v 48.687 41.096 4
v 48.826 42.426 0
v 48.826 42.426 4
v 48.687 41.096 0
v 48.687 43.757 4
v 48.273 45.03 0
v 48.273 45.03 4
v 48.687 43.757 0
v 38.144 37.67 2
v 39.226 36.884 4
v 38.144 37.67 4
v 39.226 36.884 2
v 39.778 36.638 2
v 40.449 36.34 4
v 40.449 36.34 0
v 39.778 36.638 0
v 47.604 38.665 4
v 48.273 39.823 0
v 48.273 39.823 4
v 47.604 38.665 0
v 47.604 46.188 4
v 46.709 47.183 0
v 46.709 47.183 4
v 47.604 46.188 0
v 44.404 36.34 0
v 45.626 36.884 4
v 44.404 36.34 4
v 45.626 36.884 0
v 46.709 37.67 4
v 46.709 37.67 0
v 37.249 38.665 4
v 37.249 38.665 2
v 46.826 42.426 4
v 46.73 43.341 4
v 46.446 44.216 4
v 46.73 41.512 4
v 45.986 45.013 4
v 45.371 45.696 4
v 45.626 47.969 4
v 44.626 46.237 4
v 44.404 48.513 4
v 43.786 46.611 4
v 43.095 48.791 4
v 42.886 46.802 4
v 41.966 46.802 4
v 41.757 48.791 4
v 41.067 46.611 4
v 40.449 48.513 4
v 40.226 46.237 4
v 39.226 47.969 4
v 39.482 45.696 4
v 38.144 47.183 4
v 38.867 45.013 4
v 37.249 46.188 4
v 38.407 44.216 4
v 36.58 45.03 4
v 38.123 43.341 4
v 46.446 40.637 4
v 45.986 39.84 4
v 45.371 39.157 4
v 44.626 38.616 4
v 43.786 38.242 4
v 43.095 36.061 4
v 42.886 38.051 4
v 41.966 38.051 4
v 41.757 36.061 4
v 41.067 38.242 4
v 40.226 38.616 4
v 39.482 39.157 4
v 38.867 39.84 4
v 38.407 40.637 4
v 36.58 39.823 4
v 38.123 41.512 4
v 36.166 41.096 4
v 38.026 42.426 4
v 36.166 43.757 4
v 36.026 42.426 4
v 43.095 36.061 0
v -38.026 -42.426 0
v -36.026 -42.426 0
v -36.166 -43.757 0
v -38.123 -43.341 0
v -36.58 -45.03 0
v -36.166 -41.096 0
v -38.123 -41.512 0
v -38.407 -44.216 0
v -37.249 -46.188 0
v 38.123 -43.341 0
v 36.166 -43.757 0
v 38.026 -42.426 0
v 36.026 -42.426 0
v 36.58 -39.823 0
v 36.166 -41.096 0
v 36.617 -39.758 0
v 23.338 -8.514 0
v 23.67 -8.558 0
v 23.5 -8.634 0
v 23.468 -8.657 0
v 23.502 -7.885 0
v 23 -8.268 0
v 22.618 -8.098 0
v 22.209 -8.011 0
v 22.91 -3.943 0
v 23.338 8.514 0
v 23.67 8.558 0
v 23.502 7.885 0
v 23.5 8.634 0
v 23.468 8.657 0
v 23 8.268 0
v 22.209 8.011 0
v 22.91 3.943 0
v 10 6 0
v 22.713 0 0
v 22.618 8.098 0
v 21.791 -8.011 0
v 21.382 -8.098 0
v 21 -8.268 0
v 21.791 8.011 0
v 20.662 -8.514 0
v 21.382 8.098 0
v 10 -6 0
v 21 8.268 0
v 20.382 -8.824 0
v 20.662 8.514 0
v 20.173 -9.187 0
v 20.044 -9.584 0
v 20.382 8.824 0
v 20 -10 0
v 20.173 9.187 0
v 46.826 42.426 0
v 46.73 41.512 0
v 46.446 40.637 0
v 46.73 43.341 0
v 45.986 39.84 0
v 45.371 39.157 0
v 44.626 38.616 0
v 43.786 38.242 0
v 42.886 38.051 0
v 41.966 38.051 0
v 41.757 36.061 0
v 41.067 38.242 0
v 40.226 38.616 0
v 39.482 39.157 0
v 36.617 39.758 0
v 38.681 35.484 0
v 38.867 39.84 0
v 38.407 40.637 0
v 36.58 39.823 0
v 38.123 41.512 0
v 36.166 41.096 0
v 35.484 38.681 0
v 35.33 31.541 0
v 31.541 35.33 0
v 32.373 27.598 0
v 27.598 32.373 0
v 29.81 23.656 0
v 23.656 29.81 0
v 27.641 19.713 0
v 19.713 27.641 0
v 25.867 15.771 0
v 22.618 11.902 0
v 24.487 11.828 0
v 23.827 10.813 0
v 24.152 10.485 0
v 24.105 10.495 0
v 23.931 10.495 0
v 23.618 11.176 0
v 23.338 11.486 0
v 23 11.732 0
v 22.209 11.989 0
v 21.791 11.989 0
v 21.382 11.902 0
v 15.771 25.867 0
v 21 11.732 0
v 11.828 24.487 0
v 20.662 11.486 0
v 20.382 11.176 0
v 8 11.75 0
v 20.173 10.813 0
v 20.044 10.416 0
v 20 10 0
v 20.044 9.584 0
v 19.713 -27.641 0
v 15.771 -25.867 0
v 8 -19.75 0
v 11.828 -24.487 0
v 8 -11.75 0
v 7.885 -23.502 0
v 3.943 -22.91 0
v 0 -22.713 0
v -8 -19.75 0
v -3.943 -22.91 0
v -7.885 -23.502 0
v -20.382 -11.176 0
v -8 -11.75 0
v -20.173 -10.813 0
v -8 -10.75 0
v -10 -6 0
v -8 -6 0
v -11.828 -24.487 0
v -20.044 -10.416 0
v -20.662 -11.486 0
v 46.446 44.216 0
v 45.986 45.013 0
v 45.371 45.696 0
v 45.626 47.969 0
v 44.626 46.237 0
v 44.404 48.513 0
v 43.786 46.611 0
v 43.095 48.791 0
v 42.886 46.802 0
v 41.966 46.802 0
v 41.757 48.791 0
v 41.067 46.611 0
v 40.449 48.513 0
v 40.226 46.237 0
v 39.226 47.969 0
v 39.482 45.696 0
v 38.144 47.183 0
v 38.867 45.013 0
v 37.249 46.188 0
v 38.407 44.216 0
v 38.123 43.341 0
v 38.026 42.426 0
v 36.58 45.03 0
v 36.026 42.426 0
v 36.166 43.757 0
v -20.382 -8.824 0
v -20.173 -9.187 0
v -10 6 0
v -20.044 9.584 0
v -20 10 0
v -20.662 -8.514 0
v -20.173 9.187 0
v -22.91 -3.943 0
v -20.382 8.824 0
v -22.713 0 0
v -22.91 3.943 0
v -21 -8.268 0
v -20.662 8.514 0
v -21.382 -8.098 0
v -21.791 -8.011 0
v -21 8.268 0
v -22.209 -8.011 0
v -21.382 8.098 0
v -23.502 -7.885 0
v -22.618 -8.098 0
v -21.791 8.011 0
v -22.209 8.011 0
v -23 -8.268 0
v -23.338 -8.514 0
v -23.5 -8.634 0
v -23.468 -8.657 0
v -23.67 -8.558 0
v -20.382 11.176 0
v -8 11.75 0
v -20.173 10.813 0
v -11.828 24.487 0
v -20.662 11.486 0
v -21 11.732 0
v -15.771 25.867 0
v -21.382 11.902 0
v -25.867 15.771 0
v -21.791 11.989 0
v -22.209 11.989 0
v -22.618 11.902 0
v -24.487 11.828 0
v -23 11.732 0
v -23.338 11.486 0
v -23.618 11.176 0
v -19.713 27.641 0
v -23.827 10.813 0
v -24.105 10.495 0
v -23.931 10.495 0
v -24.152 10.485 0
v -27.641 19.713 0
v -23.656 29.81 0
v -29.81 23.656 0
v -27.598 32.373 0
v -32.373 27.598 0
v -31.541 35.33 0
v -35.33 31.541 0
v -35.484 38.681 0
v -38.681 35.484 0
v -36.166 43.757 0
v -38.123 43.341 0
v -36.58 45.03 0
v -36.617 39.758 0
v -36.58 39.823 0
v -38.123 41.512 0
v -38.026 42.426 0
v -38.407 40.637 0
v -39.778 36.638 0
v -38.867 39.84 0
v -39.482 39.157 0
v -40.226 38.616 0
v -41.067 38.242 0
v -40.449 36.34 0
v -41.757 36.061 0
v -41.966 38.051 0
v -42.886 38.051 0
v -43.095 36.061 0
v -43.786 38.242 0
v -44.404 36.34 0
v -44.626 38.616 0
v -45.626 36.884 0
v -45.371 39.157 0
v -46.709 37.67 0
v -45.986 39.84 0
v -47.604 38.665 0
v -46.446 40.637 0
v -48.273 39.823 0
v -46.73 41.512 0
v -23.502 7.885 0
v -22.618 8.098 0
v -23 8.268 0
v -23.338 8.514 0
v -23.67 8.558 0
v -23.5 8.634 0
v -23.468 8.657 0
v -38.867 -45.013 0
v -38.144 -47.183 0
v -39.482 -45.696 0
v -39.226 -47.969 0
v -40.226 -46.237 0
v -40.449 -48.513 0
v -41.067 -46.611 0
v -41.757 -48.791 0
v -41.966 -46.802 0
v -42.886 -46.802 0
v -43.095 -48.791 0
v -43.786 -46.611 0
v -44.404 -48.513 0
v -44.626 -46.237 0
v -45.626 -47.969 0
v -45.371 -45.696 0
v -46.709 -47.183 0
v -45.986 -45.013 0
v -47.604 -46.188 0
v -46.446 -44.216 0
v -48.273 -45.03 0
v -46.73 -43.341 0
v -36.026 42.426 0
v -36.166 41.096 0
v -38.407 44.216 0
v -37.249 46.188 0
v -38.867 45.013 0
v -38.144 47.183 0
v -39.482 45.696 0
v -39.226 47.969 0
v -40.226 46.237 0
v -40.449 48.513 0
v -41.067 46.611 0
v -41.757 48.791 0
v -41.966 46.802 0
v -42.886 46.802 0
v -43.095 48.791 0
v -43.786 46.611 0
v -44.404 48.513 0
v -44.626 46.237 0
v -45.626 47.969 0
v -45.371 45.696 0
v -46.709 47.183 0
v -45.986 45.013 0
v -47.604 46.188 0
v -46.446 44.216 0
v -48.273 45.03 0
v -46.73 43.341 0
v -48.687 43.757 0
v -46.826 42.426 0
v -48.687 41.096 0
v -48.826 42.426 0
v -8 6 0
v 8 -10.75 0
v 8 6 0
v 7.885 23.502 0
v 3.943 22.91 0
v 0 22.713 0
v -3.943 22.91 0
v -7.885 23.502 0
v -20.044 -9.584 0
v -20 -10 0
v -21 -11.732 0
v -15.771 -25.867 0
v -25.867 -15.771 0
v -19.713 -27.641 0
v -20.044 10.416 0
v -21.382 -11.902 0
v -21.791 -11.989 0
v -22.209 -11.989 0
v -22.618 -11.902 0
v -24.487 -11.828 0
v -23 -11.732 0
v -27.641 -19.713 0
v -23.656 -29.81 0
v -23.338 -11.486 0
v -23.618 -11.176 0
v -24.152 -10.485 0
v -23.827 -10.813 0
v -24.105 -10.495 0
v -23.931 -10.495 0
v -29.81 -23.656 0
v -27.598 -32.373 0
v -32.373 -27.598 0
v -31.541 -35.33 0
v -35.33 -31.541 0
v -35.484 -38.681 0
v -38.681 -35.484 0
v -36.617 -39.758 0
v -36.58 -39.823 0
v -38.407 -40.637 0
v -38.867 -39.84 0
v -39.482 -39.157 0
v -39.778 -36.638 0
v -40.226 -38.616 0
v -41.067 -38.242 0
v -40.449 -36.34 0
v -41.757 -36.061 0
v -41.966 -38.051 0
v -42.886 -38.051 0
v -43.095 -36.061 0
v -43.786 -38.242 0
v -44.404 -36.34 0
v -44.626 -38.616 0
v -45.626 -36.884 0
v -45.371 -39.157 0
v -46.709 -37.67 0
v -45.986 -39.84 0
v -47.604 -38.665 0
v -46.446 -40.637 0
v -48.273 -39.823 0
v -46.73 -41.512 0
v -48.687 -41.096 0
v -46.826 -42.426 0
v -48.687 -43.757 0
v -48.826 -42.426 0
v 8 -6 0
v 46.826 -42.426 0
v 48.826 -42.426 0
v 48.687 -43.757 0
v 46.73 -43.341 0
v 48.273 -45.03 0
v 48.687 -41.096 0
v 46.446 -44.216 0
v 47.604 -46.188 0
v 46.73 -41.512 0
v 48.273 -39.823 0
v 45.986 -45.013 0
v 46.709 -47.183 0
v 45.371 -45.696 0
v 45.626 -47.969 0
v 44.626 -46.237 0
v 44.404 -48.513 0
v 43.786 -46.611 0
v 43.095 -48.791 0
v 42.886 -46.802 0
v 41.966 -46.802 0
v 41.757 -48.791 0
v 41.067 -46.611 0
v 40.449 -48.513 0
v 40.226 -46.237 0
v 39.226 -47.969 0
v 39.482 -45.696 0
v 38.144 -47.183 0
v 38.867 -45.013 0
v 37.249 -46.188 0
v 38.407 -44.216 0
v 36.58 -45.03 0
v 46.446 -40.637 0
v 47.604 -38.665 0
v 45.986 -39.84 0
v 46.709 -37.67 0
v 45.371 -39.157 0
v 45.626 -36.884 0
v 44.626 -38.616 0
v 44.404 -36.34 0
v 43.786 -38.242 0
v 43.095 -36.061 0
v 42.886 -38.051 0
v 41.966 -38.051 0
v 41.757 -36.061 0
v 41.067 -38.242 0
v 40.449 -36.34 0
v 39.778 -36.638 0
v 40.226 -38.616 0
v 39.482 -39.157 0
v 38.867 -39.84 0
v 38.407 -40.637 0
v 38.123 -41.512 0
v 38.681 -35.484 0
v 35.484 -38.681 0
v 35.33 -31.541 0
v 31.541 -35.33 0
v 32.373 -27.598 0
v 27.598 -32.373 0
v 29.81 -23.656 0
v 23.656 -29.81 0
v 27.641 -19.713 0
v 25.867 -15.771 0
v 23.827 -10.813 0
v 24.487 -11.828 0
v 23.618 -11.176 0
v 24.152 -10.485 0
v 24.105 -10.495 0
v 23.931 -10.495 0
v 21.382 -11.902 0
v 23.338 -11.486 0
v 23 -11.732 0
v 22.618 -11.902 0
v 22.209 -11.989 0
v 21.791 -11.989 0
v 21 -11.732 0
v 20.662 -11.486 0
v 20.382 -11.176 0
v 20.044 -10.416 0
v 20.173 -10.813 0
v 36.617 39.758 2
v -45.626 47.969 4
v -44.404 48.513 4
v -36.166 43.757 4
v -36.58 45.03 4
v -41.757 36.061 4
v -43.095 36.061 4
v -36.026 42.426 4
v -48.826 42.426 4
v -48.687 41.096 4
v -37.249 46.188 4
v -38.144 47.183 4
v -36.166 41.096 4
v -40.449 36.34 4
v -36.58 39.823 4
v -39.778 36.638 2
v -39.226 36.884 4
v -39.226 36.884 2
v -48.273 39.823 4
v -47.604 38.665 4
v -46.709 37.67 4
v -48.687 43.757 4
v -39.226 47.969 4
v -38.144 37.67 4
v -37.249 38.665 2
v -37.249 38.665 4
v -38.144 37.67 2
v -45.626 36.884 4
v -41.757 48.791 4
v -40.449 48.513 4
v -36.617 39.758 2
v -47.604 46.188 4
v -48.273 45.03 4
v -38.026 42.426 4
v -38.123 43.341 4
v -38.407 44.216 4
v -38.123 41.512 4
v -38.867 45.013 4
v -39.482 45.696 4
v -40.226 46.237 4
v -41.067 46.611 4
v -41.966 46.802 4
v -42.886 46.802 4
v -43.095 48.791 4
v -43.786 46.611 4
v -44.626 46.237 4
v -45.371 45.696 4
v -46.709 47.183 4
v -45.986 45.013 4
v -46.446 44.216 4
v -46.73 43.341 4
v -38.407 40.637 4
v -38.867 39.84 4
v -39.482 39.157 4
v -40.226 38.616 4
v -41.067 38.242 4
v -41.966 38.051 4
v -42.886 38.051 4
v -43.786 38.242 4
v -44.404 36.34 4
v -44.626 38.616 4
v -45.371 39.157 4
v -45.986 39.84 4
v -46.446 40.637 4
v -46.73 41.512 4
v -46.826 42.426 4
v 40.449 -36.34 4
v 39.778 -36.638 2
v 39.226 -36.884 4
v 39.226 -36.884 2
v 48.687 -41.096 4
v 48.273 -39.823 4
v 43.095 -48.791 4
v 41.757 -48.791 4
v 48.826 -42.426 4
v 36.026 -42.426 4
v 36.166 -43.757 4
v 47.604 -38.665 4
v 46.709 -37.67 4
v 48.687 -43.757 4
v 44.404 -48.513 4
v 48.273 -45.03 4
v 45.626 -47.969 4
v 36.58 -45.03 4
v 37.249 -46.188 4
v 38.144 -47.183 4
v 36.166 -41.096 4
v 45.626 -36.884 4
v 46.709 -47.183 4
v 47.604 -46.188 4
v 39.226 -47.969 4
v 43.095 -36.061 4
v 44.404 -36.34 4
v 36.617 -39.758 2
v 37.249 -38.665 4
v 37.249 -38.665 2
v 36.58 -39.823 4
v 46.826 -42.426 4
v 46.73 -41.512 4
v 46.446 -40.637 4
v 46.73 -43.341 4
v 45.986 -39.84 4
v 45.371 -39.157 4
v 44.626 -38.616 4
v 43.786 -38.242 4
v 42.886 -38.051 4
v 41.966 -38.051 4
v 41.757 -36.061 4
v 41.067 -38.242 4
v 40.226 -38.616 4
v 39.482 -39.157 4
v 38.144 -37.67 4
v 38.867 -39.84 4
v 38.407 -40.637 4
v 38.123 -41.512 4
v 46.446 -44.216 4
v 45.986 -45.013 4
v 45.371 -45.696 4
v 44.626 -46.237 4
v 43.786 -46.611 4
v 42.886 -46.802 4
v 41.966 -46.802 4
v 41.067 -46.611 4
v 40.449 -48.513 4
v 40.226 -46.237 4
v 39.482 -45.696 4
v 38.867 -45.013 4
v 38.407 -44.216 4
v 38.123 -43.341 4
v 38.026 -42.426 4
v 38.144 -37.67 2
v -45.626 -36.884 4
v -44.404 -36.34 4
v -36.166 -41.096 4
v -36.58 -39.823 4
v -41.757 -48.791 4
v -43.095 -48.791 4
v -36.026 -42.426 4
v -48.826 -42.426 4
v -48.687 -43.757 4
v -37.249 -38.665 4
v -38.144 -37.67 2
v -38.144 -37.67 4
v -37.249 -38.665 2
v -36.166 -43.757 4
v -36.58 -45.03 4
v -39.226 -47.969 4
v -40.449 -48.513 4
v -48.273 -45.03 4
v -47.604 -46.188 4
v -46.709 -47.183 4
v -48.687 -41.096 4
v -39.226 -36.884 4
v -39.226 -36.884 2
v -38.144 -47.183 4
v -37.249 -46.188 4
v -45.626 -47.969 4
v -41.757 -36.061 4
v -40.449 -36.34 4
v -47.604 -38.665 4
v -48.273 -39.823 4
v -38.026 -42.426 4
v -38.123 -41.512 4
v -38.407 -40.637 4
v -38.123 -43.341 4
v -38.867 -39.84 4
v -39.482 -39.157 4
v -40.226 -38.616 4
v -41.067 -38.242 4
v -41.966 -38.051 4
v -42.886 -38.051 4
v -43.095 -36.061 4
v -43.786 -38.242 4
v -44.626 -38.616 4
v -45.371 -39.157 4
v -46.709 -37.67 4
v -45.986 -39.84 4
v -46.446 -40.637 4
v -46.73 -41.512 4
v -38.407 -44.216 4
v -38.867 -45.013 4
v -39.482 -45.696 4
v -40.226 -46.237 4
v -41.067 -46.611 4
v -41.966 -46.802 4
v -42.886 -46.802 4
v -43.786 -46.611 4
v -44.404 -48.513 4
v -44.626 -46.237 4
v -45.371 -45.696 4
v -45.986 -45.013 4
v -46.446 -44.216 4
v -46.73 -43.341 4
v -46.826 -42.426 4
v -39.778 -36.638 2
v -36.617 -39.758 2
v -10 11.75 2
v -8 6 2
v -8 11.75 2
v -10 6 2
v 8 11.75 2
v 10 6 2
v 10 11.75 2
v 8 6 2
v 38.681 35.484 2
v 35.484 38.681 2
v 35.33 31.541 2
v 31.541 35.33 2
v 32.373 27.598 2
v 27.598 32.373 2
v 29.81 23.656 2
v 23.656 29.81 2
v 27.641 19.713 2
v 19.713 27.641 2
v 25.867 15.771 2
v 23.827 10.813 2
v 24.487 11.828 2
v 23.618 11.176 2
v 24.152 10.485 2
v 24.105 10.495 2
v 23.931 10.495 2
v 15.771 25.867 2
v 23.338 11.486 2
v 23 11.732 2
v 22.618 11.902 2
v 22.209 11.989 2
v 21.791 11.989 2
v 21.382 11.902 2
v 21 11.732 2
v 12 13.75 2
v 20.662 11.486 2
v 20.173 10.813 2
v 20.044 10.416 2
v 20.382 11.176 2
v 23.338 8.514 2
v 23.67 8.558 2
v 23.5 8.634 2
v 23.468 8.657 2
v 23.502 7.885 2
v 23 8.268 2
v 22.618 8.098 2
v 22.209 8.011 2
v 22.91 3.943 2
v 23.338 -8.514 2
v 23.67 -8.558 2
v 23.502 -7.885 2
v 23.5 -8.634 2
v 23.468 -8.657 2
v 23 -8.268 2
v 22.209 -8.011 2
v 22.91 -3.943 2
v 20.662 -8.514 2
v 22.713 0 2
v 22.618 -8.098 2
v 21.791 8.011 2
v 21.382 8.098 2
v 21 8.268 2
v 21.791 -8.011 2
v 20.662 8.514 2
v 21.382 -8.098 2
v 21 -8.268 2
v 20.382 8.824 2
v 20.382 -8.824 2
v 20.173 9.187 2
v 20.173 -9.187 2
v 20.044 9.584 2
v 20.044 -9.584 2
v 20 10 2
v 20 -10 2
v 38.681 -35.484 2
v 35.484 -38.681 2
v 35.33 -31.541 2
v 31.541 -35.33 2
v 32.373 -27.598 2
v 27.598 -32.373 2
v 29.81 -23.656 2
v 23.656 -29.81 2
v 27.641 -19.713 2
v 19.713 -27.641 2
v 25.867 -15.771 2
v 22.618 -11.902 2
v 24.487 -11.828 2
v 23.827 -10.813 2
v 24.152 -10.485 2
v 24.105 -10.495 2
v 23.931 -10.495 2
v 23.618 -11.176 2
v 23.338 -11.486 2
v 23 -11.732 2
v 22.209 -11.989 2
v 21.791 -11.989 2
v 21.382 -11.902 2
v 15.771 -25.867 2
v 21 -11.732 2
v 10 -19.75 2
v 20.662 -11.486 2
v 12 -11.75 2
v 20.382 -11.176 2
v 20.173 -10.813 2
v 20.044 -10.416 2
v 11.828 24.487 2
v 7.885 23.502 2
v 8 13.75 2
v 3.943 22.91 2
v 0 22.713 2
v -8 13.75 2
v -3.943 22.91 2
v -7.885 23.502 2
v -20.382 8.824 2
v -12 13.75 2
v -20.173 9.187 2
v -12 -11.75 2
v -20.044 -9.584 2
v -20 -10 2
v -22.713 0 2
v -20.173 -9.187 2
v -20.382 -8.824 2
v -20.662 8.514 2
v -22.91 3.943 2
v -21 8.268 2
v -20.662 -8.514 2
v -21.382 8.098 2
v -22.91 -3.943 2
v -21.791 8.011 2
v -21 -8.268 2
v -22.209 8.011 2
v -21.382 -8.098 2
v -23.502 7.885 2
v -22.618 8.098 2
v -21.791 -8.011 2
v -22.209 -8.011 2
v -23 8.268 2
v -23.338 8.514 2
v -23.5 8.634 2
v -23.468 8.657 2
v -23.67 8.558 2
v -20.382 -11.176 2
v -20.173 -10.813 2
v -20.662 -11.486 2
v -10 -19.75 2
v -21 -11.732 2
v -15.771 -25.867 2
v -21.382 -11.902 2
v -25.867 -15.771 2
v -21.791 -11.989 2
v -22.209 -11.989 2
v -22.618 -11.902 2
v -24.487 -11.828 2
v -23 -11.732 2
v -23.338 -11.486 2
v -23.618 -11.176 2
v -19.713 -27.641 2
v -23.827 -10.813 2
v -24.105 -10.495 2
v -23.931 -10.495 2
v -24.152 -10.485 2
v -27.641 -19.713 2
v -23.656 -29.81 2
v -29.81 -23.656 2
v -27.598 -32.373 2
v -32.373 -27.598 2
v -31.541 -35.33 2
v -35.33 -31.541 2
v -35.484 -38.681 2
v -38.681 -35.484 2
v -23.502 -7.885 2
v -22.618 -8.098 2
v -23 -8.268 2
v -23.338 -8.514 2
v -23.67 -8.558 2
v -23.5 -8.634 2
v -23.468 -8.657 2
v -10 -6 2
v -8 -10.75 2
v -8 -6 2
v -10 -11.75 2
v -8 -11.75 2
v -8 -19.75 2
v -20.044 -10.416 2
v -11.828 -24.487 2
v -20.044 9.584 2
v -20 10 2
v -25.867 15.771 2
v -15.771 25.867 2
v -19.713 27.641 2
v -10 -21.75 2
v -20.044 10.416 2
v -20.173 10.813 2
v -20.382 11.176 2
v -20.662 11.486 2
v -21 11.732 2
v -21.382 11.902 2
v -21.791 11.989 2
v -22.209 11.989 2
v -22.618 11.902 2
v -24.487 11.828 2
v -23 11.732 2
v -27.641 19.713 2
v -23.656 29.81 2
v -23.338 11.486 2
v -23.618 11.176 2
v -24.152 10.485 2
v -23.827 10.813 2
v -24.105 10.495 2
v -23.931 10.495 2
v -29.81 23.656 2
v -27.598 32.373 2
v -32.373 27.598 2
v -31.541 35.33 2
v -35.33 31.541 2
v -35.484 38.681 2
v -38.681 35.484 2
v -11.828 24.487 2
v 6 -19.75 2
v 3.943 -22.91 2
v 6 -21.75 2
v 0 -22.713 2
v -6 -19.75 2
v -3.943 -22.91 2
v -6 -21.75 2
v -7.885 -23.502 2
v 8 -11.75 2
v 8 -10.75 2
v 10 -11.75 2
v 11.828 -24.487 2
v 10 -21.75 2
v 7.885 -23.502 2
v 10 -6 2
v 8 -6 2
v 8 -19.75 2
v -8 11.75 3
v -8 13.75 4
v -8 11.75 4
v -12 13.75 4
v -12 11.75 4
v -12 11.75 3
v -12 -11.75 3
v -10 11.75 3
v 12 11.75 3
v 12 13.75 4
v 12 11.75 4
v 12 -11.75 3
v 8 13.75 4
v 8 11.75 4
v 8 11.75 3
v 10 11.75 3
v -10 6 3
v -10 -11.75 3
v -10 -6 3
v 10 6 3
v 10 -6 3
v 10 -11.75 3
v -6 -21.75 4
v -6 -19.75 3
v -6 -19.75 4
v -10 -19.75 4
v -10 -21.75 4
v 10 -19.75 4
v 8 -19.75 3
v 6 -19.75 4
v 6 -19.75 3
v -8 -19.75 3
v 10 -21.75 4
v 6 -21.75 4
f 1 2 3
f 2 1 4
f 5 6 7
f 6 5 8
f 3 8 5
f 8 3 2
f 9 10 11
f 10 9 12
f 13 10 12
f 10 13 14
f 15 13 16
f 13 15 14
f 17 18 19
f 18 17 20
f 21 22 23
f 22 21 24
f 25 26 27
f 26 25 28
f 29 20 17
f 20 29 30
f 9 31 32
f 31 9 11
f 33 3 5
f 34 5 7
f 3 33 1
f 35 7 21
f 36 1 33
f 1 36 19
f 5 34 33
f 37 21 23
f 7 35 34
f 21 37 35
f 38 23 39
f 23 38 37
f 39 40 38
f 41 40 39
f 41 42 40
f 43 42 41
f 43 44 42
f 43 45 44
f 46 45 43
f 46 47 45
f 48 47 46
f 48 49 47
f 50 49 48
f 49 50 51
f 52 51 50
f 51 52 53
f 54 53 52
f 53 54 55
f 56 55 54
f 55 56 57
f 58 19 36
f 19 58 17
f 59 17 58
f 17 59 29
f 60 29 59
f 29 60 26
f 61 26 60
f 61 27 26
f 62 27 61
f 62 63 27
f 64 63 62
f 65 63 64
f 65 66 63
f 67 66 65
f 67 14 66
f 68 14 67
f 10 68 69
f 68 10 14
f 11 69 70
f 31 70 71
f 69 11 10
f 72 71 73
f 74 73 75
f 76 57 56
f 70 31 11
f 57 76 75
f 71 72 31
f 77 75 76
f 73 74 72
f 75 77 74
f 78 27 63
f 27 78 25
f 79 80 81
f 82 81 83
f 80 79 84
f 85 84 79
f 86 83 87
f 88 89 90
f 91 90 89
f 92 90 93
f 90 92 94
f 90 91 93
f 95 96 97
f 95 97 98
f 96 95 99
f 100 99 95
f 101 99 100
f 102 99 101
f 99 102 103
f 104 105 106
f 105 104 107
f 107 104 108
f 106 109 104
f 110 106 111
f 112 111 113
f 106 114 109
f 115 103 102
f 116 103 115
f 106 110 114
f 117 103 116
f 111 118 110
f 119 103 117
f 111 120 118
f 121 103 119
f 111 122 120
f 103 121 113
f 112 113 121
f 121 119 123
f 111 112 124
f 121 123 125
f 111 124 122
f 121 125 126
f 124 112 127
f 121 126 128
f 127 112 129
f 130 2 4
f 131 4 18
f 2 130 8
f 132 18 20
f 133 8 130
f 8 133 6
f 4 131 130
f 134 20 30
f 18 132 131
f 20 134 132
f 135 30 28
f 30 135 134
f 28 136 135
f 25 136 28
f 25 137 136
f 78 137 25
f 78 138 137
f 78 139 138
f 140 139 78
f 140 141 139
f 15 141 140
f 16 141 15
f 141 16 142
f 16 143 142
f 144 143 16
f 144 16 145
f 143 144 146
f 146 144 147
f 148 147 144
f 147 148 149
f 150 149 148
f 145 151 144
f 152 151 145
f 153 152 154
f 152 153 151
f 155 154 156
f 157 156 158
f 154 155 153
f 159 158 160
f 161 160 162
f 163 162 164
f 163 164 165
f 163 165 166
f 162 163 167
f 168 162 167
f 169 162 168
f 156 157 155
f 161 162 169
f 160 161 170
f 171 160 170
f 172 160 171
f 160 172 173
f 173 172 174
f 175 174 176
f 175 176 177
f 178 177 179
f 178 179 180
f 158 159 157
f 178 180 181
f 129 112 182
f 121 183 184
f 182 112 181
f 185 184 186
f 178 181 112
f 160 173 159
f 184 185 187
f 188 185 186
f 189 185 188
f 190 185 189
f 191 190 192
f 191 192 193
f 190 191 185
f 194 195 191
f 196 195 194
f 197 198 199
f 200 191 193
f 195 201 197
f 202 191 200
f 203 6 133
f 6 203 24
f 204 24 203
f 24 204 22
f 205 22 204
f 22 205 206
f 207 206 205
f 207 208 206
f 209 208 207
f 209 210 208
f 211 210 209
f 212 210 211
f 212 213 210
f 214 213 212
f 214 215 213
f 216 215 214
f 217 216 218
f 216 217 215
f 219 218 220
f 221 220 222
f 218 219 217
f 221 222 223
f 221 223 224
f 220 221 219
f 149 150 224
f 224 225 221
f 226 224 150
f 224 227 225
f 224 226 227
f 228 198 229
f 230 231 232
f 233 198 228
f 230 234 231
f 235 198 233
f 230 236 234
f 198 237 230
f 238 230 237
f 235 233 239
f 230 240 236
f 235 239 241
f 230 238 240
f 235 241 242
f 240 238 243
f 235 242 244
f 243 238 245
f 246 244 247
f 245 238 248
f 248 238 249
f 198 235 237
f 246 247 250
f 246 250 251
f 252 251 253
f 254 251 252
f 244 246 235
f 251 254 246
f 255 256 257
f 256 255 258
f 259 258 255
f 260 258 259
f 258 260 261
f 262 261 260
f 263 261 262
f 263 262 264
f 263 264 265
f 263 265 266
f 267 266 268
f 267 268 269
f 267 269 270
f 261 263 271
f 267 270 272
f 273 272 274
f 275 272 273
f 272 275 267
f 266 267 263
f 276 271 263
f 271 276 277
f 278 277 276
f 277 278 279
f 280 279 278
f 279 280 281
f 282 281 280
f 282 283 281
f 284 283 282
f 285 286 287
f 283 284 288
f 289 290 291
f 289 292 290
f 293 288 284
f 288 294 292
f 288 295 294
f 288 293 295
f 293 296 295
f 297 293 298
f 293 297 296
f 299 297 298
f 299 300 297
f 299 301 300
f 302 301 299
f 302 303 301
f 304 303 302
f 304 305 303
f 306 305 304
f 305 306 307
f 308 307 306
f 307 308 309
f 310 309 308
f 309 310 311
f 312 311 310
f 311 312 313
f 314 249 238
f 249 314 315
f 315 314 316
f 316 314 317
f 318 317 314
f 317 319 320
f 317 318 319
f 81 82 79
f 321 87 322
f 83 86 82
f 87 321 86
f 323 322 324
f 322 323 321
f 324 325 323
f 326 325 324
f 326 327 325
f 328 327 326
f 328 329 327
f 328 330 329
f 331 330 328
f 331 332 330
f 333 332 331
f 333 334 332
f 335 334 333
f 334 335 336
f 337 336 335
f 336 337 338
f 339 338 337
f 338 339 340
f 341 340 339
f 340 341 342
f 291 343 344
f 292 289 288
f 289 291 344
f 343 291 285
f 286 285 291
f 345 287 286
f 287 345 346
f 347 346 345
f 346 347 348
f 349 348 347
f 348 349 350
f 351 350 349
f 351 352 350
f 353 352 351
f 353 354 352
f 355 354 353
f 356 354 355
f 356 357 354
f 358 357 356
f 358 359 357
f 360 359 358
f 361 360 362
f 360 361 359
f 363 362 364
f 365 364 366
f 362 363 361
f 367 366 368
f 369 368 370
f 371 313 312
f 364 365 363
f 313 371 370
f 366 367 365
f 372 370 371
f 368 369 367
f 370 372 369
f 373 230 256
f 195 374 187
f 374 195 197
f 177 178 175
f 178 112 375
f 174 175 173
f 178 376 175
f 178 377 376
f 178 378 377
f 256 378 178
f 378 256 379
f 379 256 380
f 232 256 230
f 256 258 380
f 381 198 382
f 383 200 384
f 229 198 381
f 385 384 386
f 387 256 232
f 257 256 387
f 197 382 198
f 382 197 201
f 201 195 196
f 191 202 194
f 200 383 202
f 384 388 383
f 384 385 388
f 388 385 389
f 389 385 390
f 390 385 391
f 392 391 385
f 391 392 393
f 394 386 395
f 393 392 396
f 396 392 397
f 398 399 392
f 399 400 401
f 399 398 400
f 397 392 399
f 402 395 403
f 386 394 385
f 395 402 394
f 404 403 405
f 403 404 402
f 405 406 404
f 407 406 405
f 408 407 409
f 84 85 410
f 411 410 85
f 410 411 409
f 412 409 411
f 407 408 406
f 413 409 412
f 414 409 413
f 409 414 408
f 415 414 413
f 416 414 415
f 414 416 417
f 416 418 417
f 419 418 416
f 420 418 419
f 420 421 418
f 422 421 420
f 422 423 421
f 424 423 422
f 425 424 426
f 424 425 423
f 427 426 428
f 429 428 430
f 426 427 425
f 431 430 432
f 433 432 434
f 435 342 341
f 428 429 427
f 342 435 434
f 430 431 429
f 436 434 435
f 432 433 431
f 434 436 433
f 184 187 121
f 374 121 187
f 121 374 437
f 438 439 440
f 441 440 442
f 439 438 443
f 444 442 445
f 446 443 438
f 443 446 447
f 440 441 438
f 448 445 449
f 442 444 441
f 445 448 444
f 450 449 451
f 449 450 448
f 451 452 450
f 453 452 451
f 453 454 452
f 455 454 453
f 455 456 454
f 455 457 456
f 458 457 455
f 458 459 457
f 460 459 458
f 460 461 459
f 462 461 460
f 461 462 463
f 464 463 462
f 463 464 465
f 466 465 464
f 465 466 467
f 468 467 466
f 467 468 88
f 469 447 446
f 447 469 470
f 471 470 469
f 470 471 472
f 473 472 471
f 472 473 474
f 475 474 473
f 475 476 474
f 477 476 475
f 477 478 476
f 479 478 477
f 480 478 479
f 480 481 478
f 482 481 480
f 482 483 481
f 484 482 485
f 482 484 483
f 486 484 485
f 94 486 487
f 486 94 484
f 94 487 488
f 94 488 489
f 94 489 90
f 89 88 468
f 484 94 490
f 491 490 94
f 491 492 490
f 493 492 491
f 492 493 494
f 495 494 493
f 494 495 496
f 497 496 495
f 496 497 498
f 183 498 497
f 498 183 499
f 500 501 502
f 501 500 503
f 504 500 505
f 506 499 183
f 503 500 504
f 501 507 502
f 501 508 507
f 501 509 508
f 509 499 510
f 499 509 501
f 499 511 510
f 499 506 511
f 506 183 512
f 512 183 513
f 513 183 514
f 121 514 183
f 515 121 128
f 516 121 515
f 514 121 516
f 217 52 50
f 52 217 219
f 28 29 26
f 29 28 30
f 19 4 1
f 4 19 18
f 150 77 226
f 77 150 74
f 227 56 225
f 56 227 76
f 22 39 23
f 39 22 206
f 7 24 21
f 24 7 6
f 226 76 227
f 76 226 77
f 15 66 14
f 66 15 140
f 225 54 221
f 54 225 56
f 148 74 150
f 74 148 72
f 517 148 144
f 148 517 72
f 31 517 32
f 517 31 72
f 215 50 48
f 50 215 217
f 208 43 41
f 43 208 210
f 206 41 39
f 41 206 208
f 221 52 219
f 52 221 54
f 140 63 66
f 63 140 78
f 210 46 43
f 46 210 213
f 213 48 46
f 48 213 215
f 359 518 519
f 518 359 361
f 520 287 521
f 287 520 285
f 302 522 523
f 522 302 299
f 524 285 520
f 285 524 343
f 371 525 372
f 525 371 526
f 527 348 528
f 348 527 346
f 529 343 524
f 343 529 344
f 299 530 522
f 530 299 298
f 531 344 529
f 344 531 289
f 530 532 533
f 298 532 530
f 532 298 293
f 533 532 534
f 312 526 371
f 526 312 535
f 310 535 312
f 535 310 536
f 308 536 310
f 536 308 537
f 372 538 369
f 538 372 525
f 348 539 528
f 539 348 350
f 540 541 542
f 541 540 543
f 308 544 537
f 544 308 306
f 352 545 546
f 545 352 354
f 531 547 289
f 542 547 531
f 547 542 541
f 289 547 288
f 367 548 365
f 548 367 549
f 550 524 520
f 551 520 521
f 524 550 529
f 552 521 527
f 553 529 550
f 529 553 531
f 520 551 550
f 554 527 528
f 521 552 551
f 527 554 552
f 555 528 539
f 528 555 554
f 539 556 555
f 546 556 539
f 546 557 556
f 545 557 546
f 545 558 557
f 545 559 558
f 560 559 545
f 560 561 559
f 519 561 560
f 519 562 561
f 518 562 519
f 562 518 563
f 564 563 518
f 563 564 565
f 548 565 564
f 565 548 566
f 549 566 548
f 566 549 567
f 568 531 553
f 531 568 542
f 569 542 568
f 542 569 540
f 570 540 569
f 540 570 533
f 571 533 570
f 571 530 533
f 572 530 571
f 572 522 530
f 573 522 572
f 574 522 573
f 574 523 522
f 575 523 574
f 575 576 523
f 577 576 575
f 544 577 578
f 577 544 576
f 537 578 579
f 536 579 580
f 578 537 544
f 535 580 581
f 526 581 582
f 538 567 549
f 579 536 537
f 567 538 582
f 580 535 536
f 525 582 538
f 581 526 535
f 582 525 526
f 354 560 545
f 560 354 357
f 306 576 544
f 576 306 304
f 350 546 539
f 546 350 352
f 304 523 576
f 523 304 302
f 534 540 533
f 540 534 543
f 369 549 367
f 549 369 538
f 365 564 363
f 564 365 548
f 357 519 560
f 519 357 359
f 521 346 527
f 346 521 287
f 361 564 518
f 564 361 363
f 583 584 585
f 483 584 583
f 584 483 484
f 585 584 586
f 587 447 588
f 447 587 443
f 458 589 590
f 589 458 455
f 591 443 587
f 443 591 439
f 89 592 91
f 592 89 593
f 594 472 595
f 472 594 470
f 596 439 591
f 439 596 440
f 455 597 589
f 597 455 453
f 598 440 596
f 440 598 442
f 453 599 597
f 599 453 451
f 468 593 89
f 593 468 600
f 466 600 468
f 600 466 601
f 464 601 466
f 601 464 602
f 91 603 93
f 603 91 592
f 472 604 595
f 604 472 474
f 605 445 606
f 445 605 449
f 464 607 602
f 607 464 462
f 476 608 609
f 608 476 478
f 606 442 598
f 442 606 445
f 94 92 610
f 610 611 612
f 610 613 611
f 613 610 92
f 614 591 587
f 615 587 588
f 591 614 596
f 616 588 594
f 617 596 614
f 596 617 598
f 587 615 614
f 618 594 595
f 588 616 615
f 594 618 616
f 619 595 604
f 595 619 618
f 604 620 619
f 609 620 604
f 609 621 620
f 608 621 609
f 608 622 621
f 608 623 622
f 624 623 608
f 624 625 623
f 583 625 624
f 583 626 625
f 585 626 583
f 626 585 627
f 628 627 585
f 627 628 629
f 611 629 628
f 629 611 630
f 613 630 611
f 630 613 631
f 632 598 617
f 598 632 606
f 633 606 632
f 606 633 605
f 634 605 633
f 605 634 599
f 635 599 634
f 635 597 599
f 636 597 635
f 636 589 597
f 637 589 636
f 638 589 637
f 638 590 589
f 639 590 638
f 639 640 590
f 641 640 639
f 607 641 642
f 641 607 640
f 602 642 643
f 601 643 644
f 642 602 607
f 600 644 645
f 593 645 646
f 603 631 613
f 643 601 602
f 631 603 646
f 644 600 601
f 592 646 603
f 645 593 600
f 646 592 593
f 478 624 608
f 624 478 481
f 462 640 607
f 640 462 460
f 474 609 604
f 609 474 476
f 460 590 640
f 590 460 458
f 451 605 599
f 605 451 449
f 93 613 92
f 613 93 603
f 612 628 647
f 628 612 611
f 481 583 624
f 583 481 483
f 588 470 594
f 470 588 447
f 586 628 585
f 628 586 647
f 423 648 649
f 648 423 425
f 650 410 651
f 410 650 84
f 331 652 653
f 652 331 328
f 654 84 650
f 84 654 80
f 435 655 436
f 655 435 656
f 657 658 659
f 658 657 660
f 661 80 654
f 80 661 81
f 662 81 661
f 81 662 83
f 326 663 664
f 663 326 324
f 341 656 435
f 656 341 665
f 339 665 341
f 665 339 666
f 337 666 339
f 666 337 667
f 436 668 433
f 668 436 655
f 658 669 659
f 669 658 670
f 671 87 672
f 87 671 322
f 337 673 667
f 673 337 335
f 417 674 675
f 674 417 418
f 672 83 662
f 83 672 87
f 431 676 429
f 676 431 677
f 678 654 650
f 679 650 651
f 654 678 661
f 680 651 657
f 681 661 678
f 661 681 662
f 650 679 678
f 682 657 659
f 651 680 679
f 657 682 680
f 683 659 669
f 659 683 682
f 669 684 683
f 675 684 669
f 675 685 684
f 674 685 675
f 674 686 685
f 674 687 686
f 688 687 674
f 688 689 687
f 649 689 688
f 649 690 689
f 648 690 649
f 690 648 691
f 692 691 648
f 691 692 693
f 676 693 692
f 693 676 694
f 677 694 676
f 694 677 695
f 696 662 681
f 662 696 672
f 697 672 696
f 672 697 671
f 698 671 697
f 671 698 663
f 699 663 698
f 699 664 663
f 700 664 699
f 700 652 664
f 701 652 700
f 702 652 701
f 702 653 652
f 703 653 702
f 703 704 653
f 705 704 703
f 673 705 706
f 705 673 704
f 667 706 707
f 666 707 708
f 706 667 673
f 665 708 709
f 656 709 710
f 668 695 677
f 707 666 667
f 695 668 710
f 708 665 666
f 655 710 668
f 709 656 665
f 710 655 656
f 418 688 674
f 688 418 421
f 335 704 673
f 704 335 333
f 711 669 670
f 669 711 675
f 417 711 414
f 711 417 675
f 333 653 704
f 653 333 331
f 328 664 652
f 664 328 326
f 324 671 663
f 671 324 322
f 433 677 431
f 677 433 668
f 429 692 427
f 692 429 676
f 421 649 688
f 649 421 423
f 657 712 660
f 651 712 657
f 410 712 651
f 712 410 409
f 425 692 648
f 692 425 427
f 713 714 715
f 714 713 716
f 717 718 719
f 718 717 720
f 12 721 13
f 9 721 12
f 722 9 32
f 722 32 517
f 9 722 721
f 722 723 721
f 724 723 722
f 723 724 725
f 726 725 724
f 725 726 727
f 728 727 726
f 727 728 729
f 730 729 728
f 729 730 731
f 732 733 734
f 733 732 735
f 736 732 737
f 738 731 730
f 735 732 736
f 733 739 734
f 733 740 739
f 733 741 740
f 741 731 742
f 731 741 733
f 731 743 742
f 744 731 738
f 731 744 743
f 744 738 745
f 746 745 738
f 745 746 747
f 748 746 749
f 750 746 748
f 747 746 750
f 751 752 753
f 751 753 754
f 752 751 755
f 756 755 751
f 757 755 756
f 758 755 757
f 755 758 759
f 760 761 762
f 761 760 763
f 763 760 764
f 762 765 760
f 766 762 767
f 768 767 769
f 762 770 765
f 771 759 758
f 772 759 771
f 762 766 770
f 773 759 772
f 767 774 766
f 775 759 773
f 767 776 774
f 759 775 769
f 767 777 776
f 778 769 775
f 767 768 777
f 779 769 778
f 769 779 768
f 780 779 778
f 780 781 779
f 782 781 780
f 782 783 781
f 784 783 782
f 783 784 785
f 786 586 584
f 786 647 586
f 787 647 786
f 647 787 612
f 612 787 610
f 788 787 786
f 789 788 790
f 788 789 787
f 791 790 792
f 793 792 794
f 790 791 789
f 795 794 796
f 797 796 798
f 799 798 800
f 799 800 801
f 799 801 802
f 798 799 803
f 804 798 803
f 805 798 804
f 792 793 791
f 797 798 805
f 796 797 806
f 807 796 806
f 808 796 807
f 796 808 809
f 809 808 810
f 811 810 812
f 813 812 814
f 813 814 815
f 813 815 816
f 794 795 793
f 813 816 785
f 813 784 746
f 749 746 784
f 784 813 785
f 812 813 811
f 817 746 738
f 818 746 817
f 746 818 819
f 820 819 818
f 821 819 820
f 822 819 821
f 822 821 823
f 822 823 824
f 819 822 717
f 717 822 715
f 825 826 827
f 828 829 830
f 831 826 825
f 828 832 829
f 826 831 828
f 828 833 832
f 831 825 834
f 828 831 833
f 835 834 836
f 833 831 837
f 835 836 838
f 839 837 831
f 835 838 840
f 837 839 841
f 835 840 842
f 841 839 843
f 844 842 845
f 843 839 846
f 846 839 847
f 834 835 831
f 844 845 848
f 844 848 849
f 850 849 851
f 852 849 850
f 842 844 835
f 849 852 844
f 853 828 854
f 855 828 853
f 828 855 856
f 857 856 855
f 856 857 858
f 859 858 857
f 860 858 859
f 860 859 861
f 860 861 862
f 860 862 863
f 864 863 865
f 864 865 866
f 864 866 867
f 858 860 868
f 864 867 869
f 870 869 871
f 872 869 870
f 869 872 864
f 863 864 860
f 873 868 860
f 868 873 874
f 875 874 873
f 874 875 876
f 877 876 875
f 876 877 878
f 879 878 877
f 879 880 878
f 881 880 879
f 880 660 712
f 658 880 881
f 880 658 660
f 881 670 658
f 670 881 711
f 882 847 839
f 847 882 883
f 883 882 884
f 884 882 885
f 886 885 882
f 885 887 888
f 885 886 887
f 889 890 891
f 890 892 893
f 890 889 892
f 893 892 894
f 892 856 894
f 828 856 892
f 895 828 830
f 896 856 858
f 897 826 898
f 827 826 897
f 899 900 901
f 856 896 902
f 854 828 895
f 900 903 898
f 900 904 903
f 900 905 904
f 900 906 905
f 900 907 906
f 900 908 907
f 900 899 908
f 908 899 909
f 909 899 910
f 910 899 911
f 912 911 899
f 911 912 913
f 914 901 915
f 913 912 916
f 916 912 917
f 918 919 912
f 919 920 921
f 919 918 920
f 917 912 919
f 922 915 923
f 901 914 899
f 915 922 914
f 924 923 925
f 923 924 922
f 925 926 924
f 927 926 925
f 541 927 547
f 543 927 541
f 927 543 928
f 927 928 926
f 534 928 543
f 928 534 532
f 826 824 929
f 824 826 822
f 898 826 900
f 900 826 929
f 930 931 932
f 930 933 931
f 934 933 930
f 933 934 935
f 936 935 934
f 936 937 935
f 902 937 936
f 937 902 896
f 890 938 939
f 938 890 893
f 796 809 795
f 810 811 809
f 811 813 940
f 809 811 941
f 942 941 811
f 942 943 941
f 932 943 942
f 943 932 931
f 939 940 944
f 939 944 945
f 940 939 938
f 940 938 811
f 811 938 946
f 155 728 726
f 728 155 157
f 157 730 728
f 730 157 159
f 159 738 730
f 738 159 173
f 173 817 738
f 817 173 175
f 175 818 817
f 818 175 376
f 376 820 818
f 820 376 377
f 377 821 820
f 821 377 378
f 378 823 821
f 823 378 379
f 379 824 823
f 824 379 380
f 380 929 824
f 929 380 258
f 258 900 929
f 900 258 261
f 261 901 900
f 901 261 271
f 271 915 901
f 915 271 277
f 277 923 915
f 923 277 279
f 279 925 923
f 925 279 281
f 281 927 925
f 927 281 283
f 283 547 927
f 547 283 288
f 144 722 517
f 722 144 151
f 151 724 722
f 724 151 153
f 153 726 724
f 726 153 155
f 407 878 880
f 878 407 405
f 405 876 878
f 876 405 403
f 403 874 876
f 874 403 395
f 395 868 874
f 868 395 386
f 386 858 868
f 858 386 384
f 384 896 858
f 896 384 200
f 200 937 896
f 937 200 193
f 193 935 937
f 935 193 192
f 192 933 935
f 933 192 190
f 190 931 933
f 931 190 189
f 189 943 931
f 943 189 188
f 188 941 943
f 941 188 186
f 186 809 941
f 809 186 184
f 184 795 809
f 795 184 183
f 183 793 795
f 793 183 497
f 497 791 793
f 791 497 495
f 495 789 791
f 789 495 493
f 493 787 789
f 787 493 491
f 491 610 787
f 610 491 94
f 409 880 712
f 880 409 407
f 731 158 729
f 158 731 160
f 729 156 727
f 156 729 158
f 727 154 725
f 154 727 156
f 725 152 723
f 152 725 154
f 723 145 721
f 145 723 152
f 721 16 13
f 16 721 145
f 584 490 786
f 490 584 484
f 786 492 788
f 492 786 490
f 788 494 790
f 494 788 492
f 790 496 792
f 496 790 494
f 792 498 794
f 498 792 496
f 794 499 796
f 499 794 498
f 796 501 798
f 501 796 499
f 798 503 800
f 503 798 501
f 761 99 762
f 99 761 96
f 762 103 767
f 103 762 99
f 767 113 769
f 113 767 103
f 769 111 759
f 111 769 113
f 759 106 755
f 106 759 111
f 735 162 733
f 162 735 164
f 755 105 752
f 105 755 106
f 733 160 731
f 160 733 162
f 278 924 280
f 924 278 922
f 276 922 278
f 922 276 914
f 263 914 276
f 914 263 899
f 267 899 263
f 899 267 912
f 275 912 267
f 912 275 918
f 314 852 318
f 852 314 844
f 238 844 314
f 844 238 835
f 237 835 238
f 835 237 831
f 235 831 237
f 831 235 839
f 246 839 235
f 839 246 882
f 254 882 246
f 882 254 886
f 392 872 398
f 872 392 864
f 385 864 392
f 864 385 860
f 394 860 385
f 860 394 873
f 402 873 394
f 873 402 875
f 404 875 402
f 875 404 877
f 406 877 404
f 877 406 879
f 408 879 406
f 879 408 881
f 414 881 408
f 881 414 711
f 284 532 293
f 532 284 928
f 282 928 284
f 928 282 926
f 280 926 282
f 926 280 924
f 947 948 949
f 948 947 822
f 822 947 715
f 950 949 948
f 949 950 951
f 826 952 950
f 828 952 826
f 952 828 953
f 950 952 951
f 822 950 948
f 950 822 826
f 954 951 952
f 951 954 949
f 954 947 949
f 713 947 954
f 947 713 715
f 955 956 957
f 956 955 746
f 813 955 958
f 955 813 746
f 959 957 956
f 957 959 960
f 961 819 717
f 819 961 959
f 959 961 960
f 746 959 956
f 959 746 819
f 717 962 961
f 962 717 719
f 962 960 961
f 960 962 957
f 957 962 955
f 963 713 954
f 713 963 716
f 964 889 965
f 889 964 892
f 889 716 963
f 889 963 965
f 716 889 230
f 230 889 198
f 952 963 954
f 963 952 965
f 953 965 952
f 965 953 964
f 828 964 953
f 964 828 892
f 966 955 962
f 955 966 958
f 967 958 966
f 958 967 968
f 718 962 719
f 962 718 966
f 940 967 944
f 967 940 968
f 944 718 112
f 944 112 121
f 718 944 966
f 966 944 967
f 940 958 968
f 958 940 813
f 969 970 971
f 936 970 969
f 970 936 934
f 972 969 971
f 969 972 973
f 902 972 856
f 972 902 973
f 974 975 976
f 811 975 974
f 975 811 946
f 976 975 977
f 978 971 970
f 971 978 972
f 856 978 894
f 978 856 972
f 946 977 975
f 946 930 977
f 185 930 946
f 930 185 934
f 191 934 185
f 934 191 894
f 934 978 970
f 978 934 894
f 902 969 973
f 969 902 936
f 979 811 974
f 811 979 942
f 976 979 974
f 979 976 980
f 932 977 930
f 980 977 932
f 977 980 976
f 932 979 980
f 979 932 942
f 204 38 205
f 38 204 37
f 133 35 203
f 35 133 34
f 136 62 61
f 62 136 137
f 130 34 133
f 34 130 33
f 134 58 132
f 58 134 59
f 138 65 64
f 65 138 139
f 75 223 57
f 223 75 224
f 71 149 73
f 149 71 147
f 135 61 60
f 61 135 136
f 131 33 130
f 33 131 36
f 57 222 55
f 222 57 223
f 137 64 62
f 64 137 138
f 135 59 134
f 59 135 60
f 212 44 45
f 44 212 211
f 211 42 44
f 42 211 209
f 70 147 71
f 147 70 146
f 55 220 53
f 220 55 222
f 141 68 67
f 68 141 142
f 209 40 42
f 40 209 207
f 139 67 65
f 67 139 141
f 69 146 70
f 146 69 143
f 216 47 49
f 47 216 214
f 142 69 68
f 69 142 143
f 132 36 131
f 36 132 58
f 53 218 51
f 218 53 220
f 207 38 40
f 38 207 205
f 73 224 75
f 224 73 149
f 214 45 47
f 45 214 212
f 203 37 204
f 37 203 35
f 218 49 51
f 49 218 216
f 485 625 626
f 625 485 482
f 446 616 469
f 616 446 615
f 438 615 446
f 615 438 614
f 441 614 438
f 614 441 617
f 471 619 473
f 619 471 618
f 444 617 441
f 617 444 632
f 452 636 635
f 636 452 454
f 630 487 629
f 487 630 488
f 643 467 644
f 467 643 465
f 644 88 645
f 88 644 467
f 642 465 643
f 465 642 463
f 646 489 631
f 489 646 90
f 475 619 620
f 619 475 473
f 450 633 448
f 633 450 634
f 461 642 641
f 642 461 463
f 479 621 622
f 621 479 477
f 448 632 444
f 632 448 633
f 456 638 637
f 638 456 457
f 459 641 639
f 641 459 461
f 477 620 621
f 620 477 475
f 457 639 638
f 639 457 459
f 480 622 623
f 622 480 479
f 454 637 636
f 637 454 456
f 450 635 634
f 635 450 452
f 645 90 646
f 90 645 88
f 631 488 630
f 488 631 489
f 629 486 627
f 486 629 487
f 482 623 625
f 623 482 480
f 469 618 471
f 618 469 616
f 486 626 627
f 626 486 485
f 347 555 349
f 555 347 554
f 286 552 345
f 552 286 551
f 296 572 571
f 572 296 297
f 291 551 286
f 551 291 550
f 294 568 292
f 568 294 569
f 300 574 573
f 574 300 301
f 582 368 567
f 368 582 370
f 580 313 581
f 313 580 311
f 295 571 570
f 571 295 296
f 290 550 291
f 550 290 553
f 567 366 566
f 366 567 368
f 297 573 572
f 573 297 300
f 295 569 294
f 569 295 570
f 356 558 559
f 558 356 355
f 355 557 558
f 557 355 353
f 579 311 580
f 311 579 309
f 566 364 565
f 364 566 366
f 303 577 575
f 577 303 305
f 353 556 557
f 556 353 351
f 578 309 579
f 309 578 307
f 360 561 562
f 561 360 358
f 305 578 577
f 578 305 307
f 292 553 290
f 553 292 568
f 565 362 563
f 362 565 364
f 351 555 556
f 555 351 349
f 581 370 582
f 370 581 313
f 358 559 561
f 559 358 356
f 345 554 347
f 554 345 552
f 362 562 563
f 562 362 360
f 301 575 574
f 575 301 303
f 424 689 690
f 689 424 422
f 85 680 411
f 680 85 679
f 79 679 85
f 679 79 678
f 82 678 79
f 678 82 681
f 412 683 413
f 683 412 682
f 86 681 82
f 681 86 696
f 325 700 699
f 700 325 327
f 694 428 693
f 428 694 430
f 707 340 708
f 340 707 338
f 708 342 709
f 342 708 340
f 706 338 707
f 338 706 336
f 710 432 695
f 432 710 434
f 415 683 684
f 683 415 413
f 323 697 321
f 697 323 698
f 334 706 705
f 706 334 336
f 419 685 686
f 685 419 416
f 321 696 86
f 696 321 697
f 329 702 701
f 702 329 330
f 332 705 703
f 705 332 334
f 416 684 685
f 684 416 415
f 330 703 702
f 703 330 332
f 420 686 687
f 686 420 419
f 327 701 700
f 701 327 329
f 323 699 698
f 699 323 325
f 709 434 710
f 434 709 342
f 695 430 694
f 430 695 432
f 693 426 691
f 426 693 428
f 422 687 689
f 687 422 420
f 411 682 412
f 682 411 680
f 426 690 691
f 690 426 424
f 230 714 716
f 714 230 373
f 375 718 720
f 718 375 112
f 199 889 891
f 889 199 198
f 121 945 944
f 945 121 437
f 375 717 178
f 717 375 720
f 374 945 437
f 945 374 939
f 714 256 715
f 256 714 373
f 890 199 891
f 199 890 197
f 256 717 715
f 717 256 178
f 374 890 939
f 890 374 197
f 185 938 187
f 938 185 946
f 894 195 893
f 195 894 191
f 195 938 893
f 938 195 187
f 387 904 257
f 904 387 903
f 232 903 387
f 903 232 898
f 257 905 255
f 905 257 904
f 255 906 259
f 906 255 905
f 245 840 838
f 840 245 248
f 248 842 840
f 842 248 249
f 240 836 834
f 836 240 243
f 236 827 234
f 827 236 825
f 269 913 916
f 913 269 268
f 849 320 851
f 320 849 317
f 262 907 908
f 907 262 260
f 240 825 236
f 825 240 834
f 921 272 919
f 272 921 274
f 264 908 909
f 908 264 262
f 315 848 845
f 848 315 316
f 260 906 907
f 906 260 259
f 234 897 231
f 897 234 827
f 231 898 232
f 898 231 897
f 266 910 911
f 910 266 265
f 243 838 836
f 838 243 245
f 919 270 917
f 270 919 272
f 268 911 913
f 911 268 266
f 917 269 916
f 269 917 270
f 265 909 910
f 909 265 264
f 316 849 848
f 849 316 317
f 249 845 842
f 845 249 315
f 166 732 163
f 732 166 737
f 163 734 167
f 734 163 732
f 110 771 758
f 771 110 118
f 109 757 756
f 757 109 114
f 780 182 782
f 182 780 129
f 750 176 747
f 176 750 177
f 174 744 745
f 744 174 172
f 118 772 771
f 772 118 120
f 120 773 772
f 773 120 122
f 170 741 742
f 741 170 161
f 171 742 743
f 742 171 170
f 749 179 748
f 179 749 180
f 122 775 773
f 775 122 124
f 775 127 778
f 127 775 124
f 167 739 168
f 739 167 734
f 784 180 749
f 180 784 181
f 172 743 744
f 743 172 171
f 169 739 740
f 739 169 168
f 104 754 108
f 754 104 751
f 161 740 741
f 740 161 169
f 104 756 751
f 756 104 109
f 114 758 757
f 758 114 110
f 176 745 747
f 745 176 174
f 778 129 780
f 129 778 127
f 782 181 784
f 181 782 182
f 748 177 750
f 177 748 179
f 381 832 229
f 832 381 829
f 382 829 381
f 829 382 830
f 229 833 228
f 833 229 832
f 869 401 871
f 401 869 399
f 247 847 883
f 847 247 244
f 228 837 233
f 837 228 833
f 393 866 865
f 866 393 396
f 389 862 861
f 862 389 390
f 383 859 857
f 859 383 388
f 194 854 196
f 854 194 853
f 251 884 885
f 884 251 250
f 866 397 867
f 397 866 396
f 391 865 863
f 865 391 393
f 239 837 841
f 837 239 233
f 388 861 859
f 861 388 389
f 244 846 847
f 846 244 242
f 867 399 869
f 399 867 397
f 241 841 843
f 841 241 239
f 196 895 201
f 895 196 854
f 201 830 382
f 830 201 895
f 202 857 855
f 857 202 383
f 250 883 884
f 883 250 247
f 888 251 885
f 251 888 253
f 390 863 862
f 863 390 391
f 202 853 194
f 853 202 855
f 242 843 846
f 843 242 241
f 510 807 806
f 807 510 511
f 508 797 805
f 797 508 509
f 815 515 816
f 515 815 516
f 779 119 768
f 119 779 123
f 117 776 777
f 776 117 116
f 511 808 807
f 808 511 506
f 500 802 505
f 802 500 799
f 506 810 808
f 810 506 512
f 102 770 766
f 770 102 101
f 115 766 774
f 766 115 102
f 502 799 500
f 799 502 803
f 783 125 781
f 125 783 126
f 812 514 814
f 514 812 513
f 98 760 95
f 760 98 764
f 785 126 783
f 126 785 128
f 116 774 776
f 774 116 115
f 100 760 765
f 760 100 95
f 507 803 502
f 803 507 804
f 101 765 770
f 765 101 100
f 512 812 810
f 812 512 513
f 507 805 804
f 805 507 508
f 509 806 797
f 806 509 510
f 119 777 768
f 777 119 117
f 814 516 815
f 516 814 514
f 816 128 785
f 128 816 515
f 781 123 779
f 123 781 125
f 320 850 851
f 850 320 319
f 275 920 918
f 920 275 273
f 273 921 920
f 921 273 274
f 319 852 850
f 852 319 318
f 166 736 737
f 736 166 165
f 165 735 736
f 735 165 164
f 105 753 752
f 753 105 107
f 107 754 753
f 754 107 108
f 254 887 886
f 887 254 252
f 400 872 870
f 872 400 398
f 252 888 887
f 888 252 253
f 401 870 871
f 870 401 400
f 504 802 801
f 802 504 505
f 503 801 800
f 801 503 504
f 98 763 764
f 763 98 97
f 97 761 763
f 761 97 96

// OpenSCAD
module motorHolders(x, diameter, height) {
  motorHolder(x, x, diameter, height); 
  motorHolder(-x, x, diameter, height); 
  motorHolder(x, -x, diameter, height); 
  motorHolder(-x, -x, diameter, height); 
}

module motorHoles(x, diameter, height) {
  motorHole(x, x, diameter, height); 
  motorHole(x, -x, diameter, height); 
  motorHole(-x, x, diameter, height); 
  motorHole(-x, -x, diameter, height); 
}

module motorHolder(x, y, motorDiameter, height = 3) {
  motorRadius = motorDiameter / 2;
  translate([x, y, 0])
  linear_extrude(height)
  circle(motorRadius + 2);
}

module motorHole(x, y, motorDiameter, height = 3) {
  motorRadius = motorDiameter / 2;
  translate([x, y, -1])
  linear_extrude(height + 2)
  circle(motorRadius);
}


module sides(x, sideOffset, h) {
  sideTB(x, sideOffset, 1, h);
  sideTB(x, sideOffset, -1, h);
  sideLR(x, sideOffset, 1, h);
  sideLR(x, sideOffset, -1, h);
}

module sideLR(x, sideOffset, dir, h) {
  p0=[dir * x, x - sideOffset];
  p1=[dir * sideOffset, 0];
  p2=[dir * x, -x + sideOffset];
  linear_extrude(h)
  BezConic( p0, p1, p2, steps=20);
}

module sideTB(x, sideOffset, dir, h) {
  p0=[x - sideOffset, dir * x];
  p1=[0, dir * sideOffset];
  p2=[-x + sideOffset, dir * x];
  linear_extrude(h)
  BezConic( p0, p1, p2, steps=20);
}

module cross(x, sideOffset, dir, h) {
  p0 = [dir * x, x - sideOffset];
  p1 = [dir * (x - sideOffset), x];
  p2 = [dir * -x, -x + sideOffset];
  p3 = [dir * (-x + sideOffset), -x];

  linear_extrude(h)
  polygon([p0, p1, p2, p3]);
}

module centerHole(h) {
  union() {
    translate([-10, -6, -1])
    cube([20, 12, h + 2]);
    translate([-8, -(23.5 / 2) + 1, -1])
    cube([16, 22.5, h + 2]);

    translate([-8, -(23.5 / 2) - 8, -1])
    cube([16, 8, h + 2]);
  }
}

module strapHoles(h) {
  union() {

    translate([-22, 10, -1])
    cylinder(r = 2, h = h + 3);  

    translate([22, 10, -1])
    cylinder(r = 2, h = h + 3);  
  
    translate([-22, -10, -1])
    cylinder(r = 2, h = h + 3);  

    translate([22, -10, -1])
    cylinder(r = 2, h = h + 3);  

    translate([-24, 9.5, -1])
    cylinder(r = 1, h = h + 3);  

    translate([24, 9.5, -1])
    cylinder(r = 1, h = h + 3);  
  
    translate([-24, -9.5, -1])
    cylinder(r = 1, h = h + 3);  

    translate([24, -9.5, -1])
    cylinder(r = 1, h = h + 3);  


  }
}

module BezConic(p0,p1,p2,steps=5) {

	stepsize1 = (p1-p0)/steps;
	stepsize2 = (p2-p1)/steps;

	for (i=[0:steps-1]) {
		assign(point1 = p0+stepsize1*i) 
		assign(point2 = p1+stepsize2*i) 
		assign(point3 = p0+stepsize1*(i+1))
		assign(point4 = p1+stepsize2*(i+1))  {
			assign( bpoint1 = point1+(point2-point1)*(i/steps) )
			assign( bpoint2 = point3+(point4-point3)*((i+1)/steps) ) {
				polygon(points=[bpoint1,bpoint2,p1]);
			}
		}
	}
}

$fn = 30;

motorDistance = 120; // motor to motor distance
motorDiameter = 8.8; // hole size for 8.5mm motor
sideOffset = 3;

motorHolderHeight = 4;
crossHeight = 2;
sideHeight = 2;

x = sqrt(pow(motorDistance / 2, 2) * 2) / 2;

difference() {

  mainBody();

  motorHoles(x, motorDiameter, motorHolderHeight);
  centerHole(crossHeight);

  strapHoles(crossHeight);
}

module mainBody() {

  // motors
  motorHolders(x, motorDiameter, motorHolderHeight); 

  // cross beams
  cross(x, sideOffset, 1, crossHeight);
  cross(x, sideOffset, -1, crossHeight);

  // curved sides
  sides(x, sideOffset, sideHeight);
  
  boardMount(sideHeight);
}

module boardMount(h) {

  union() {
    translate([-12, (23.5 / 2), 0])
    cube([4, 2, h + 2]);

    translate([8, (23.5 / 2), 0])
    cube([4, 2, h + 2]);

    translate([-12, -(23.5 / 2), 0])
    cube([2, 23.5, h + 1]);

    translate([10, -(23.5 / 2), 0])
    cube([2, 23.5, h + 1]);


    translate([-10, - (23.5 / 2) - 10, 0])
    cube([4, 2, h + 2]);

    translate([6, - (23.5 / 2) - 10, 0])
    cube([4, 2, h + 2]);
  }
}
